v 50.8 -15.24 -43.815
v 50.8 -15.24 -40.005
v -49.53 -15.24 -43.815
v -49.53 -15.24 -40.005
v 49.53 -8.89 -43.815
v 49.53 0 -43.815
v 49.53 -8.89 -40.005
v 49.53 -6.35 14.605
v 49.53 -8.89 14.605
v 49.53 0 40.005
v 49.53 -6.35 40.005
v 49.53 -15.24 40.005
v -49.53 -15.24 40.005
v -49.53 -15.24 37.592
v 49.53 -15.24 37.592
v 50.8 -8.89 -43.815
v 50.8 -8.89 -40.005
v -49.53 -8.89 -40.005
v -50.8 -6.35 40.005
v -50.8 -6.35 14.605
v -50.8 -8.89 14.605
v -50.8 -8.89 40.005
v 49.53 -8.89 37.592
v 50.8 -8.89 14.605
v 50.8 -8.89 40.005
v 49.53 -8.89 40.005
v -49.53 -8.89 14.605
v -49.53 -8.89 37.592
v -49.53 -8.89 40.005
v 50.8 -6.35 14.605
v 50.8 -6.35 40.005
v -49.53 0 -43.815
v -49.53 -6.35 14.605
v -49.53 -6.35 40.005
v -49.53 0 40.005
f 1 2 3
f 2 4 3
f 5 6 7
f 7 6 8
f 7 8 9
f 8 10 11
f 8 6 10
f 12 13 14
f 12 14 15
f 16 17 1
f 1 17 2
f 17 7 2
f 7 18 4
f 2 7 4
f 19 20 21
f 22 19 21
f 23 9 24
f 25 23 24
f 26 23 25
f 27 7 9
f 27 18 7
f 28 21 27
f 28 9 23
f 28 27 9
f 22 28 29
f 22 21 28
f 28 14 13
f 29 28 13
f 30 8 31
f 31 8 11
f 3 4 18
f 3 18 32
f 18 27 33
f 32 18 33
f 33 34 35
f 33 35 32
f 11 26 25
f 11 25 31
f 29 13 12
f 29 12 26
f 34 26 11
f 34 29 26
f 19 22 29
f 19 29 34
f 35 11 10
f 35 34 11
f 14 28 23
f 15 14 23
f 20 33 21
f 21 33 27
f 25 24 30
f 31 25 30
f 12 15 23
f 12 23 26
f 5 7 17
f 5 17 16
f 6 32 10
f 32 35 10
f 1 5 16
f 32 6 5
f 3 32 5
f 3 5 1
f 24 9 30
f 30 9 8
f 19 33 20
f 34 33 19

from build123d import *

# Parameters (mm, degrees)
F0_W      = 99.06
F0_H      = 80.01
F1_DEPTH  = 8.89
F3_W      = 2.54
F3_H      = 25.4
F4_DEPTH  = 1.27
F2_W      = 2.54
F2_H      = 25.4
F5_DEPTH  = 1.27
F6_W      = 85.09
F6_H      = 6.35
F7_DEPTH  = 3.81
F8_W      = 99.06
F8_H      = 2.413
F9_DEPTH  = 6.35
F10_DEPTH = 15.24


# Not quite as in the source:
# - a feature names something its author has since deleted; it is built from what else it names


with BuildPart() as f1:
    # F0 (on Front) → F1 (new body)
    with BuildSketch(Plane.XZ):
        Rectangle(F0_W, F0_H)
    extrude(amount=F1_DEPTH)

    # F3 (on face) → F4 (join)
    with BuildSketch(Plane(origin=(-49.53, 0, 0), x_dir=(0, -1, 0), z_dir=(-1, 0, 0))):
        with Locations((7.62, 27.305)):
            Rectangle(F3_W, F3_H)
    extrude(amount=F4_DEPTH)

    # F2 (on face) → F5 (join)
    with BuildSketch(Plane.YZ.offset(49.53)):
        with Locations((-7.62, 27.305)):
            Rectangle(F2_W, F2_H)
    extrude(amount=F5_DEPTH)

    # F6 (on face) → F7 (join)
    with BuildSketch(Plane(origin=(0, 0, -40.005), x_dir=(1, 0, 0), z_dir=(0, 0, -1))):
        with Locations((-6.985, 12.065)):
            Rectangle(F6_W, F6_H)
        Polygon((35.56, 8.89), (-49.53, 8.89), (-49.53, 0), (49.53, 0), (49.53, 8.89), align=None)
    extrude(amount=F7_DEPTH)

    # F8 (on face) → F9 (join)
    with BuildSketch(Plane.XZ.offset(8.89)):
        with Locations((0, 38.7985)):
            Rectangle(F8_W, F8_H)
    extrude(amount=F9_DEPTH)

    # F10 (add): a face of the model
    f10_faces = [f1.faces().sort_by_distance(p)[0] for p in [
        (35.56, -12.065, -41.91),
    ]]
    extrude(f10_faces, amount=F10_DEPTH)


solid = f1.part
